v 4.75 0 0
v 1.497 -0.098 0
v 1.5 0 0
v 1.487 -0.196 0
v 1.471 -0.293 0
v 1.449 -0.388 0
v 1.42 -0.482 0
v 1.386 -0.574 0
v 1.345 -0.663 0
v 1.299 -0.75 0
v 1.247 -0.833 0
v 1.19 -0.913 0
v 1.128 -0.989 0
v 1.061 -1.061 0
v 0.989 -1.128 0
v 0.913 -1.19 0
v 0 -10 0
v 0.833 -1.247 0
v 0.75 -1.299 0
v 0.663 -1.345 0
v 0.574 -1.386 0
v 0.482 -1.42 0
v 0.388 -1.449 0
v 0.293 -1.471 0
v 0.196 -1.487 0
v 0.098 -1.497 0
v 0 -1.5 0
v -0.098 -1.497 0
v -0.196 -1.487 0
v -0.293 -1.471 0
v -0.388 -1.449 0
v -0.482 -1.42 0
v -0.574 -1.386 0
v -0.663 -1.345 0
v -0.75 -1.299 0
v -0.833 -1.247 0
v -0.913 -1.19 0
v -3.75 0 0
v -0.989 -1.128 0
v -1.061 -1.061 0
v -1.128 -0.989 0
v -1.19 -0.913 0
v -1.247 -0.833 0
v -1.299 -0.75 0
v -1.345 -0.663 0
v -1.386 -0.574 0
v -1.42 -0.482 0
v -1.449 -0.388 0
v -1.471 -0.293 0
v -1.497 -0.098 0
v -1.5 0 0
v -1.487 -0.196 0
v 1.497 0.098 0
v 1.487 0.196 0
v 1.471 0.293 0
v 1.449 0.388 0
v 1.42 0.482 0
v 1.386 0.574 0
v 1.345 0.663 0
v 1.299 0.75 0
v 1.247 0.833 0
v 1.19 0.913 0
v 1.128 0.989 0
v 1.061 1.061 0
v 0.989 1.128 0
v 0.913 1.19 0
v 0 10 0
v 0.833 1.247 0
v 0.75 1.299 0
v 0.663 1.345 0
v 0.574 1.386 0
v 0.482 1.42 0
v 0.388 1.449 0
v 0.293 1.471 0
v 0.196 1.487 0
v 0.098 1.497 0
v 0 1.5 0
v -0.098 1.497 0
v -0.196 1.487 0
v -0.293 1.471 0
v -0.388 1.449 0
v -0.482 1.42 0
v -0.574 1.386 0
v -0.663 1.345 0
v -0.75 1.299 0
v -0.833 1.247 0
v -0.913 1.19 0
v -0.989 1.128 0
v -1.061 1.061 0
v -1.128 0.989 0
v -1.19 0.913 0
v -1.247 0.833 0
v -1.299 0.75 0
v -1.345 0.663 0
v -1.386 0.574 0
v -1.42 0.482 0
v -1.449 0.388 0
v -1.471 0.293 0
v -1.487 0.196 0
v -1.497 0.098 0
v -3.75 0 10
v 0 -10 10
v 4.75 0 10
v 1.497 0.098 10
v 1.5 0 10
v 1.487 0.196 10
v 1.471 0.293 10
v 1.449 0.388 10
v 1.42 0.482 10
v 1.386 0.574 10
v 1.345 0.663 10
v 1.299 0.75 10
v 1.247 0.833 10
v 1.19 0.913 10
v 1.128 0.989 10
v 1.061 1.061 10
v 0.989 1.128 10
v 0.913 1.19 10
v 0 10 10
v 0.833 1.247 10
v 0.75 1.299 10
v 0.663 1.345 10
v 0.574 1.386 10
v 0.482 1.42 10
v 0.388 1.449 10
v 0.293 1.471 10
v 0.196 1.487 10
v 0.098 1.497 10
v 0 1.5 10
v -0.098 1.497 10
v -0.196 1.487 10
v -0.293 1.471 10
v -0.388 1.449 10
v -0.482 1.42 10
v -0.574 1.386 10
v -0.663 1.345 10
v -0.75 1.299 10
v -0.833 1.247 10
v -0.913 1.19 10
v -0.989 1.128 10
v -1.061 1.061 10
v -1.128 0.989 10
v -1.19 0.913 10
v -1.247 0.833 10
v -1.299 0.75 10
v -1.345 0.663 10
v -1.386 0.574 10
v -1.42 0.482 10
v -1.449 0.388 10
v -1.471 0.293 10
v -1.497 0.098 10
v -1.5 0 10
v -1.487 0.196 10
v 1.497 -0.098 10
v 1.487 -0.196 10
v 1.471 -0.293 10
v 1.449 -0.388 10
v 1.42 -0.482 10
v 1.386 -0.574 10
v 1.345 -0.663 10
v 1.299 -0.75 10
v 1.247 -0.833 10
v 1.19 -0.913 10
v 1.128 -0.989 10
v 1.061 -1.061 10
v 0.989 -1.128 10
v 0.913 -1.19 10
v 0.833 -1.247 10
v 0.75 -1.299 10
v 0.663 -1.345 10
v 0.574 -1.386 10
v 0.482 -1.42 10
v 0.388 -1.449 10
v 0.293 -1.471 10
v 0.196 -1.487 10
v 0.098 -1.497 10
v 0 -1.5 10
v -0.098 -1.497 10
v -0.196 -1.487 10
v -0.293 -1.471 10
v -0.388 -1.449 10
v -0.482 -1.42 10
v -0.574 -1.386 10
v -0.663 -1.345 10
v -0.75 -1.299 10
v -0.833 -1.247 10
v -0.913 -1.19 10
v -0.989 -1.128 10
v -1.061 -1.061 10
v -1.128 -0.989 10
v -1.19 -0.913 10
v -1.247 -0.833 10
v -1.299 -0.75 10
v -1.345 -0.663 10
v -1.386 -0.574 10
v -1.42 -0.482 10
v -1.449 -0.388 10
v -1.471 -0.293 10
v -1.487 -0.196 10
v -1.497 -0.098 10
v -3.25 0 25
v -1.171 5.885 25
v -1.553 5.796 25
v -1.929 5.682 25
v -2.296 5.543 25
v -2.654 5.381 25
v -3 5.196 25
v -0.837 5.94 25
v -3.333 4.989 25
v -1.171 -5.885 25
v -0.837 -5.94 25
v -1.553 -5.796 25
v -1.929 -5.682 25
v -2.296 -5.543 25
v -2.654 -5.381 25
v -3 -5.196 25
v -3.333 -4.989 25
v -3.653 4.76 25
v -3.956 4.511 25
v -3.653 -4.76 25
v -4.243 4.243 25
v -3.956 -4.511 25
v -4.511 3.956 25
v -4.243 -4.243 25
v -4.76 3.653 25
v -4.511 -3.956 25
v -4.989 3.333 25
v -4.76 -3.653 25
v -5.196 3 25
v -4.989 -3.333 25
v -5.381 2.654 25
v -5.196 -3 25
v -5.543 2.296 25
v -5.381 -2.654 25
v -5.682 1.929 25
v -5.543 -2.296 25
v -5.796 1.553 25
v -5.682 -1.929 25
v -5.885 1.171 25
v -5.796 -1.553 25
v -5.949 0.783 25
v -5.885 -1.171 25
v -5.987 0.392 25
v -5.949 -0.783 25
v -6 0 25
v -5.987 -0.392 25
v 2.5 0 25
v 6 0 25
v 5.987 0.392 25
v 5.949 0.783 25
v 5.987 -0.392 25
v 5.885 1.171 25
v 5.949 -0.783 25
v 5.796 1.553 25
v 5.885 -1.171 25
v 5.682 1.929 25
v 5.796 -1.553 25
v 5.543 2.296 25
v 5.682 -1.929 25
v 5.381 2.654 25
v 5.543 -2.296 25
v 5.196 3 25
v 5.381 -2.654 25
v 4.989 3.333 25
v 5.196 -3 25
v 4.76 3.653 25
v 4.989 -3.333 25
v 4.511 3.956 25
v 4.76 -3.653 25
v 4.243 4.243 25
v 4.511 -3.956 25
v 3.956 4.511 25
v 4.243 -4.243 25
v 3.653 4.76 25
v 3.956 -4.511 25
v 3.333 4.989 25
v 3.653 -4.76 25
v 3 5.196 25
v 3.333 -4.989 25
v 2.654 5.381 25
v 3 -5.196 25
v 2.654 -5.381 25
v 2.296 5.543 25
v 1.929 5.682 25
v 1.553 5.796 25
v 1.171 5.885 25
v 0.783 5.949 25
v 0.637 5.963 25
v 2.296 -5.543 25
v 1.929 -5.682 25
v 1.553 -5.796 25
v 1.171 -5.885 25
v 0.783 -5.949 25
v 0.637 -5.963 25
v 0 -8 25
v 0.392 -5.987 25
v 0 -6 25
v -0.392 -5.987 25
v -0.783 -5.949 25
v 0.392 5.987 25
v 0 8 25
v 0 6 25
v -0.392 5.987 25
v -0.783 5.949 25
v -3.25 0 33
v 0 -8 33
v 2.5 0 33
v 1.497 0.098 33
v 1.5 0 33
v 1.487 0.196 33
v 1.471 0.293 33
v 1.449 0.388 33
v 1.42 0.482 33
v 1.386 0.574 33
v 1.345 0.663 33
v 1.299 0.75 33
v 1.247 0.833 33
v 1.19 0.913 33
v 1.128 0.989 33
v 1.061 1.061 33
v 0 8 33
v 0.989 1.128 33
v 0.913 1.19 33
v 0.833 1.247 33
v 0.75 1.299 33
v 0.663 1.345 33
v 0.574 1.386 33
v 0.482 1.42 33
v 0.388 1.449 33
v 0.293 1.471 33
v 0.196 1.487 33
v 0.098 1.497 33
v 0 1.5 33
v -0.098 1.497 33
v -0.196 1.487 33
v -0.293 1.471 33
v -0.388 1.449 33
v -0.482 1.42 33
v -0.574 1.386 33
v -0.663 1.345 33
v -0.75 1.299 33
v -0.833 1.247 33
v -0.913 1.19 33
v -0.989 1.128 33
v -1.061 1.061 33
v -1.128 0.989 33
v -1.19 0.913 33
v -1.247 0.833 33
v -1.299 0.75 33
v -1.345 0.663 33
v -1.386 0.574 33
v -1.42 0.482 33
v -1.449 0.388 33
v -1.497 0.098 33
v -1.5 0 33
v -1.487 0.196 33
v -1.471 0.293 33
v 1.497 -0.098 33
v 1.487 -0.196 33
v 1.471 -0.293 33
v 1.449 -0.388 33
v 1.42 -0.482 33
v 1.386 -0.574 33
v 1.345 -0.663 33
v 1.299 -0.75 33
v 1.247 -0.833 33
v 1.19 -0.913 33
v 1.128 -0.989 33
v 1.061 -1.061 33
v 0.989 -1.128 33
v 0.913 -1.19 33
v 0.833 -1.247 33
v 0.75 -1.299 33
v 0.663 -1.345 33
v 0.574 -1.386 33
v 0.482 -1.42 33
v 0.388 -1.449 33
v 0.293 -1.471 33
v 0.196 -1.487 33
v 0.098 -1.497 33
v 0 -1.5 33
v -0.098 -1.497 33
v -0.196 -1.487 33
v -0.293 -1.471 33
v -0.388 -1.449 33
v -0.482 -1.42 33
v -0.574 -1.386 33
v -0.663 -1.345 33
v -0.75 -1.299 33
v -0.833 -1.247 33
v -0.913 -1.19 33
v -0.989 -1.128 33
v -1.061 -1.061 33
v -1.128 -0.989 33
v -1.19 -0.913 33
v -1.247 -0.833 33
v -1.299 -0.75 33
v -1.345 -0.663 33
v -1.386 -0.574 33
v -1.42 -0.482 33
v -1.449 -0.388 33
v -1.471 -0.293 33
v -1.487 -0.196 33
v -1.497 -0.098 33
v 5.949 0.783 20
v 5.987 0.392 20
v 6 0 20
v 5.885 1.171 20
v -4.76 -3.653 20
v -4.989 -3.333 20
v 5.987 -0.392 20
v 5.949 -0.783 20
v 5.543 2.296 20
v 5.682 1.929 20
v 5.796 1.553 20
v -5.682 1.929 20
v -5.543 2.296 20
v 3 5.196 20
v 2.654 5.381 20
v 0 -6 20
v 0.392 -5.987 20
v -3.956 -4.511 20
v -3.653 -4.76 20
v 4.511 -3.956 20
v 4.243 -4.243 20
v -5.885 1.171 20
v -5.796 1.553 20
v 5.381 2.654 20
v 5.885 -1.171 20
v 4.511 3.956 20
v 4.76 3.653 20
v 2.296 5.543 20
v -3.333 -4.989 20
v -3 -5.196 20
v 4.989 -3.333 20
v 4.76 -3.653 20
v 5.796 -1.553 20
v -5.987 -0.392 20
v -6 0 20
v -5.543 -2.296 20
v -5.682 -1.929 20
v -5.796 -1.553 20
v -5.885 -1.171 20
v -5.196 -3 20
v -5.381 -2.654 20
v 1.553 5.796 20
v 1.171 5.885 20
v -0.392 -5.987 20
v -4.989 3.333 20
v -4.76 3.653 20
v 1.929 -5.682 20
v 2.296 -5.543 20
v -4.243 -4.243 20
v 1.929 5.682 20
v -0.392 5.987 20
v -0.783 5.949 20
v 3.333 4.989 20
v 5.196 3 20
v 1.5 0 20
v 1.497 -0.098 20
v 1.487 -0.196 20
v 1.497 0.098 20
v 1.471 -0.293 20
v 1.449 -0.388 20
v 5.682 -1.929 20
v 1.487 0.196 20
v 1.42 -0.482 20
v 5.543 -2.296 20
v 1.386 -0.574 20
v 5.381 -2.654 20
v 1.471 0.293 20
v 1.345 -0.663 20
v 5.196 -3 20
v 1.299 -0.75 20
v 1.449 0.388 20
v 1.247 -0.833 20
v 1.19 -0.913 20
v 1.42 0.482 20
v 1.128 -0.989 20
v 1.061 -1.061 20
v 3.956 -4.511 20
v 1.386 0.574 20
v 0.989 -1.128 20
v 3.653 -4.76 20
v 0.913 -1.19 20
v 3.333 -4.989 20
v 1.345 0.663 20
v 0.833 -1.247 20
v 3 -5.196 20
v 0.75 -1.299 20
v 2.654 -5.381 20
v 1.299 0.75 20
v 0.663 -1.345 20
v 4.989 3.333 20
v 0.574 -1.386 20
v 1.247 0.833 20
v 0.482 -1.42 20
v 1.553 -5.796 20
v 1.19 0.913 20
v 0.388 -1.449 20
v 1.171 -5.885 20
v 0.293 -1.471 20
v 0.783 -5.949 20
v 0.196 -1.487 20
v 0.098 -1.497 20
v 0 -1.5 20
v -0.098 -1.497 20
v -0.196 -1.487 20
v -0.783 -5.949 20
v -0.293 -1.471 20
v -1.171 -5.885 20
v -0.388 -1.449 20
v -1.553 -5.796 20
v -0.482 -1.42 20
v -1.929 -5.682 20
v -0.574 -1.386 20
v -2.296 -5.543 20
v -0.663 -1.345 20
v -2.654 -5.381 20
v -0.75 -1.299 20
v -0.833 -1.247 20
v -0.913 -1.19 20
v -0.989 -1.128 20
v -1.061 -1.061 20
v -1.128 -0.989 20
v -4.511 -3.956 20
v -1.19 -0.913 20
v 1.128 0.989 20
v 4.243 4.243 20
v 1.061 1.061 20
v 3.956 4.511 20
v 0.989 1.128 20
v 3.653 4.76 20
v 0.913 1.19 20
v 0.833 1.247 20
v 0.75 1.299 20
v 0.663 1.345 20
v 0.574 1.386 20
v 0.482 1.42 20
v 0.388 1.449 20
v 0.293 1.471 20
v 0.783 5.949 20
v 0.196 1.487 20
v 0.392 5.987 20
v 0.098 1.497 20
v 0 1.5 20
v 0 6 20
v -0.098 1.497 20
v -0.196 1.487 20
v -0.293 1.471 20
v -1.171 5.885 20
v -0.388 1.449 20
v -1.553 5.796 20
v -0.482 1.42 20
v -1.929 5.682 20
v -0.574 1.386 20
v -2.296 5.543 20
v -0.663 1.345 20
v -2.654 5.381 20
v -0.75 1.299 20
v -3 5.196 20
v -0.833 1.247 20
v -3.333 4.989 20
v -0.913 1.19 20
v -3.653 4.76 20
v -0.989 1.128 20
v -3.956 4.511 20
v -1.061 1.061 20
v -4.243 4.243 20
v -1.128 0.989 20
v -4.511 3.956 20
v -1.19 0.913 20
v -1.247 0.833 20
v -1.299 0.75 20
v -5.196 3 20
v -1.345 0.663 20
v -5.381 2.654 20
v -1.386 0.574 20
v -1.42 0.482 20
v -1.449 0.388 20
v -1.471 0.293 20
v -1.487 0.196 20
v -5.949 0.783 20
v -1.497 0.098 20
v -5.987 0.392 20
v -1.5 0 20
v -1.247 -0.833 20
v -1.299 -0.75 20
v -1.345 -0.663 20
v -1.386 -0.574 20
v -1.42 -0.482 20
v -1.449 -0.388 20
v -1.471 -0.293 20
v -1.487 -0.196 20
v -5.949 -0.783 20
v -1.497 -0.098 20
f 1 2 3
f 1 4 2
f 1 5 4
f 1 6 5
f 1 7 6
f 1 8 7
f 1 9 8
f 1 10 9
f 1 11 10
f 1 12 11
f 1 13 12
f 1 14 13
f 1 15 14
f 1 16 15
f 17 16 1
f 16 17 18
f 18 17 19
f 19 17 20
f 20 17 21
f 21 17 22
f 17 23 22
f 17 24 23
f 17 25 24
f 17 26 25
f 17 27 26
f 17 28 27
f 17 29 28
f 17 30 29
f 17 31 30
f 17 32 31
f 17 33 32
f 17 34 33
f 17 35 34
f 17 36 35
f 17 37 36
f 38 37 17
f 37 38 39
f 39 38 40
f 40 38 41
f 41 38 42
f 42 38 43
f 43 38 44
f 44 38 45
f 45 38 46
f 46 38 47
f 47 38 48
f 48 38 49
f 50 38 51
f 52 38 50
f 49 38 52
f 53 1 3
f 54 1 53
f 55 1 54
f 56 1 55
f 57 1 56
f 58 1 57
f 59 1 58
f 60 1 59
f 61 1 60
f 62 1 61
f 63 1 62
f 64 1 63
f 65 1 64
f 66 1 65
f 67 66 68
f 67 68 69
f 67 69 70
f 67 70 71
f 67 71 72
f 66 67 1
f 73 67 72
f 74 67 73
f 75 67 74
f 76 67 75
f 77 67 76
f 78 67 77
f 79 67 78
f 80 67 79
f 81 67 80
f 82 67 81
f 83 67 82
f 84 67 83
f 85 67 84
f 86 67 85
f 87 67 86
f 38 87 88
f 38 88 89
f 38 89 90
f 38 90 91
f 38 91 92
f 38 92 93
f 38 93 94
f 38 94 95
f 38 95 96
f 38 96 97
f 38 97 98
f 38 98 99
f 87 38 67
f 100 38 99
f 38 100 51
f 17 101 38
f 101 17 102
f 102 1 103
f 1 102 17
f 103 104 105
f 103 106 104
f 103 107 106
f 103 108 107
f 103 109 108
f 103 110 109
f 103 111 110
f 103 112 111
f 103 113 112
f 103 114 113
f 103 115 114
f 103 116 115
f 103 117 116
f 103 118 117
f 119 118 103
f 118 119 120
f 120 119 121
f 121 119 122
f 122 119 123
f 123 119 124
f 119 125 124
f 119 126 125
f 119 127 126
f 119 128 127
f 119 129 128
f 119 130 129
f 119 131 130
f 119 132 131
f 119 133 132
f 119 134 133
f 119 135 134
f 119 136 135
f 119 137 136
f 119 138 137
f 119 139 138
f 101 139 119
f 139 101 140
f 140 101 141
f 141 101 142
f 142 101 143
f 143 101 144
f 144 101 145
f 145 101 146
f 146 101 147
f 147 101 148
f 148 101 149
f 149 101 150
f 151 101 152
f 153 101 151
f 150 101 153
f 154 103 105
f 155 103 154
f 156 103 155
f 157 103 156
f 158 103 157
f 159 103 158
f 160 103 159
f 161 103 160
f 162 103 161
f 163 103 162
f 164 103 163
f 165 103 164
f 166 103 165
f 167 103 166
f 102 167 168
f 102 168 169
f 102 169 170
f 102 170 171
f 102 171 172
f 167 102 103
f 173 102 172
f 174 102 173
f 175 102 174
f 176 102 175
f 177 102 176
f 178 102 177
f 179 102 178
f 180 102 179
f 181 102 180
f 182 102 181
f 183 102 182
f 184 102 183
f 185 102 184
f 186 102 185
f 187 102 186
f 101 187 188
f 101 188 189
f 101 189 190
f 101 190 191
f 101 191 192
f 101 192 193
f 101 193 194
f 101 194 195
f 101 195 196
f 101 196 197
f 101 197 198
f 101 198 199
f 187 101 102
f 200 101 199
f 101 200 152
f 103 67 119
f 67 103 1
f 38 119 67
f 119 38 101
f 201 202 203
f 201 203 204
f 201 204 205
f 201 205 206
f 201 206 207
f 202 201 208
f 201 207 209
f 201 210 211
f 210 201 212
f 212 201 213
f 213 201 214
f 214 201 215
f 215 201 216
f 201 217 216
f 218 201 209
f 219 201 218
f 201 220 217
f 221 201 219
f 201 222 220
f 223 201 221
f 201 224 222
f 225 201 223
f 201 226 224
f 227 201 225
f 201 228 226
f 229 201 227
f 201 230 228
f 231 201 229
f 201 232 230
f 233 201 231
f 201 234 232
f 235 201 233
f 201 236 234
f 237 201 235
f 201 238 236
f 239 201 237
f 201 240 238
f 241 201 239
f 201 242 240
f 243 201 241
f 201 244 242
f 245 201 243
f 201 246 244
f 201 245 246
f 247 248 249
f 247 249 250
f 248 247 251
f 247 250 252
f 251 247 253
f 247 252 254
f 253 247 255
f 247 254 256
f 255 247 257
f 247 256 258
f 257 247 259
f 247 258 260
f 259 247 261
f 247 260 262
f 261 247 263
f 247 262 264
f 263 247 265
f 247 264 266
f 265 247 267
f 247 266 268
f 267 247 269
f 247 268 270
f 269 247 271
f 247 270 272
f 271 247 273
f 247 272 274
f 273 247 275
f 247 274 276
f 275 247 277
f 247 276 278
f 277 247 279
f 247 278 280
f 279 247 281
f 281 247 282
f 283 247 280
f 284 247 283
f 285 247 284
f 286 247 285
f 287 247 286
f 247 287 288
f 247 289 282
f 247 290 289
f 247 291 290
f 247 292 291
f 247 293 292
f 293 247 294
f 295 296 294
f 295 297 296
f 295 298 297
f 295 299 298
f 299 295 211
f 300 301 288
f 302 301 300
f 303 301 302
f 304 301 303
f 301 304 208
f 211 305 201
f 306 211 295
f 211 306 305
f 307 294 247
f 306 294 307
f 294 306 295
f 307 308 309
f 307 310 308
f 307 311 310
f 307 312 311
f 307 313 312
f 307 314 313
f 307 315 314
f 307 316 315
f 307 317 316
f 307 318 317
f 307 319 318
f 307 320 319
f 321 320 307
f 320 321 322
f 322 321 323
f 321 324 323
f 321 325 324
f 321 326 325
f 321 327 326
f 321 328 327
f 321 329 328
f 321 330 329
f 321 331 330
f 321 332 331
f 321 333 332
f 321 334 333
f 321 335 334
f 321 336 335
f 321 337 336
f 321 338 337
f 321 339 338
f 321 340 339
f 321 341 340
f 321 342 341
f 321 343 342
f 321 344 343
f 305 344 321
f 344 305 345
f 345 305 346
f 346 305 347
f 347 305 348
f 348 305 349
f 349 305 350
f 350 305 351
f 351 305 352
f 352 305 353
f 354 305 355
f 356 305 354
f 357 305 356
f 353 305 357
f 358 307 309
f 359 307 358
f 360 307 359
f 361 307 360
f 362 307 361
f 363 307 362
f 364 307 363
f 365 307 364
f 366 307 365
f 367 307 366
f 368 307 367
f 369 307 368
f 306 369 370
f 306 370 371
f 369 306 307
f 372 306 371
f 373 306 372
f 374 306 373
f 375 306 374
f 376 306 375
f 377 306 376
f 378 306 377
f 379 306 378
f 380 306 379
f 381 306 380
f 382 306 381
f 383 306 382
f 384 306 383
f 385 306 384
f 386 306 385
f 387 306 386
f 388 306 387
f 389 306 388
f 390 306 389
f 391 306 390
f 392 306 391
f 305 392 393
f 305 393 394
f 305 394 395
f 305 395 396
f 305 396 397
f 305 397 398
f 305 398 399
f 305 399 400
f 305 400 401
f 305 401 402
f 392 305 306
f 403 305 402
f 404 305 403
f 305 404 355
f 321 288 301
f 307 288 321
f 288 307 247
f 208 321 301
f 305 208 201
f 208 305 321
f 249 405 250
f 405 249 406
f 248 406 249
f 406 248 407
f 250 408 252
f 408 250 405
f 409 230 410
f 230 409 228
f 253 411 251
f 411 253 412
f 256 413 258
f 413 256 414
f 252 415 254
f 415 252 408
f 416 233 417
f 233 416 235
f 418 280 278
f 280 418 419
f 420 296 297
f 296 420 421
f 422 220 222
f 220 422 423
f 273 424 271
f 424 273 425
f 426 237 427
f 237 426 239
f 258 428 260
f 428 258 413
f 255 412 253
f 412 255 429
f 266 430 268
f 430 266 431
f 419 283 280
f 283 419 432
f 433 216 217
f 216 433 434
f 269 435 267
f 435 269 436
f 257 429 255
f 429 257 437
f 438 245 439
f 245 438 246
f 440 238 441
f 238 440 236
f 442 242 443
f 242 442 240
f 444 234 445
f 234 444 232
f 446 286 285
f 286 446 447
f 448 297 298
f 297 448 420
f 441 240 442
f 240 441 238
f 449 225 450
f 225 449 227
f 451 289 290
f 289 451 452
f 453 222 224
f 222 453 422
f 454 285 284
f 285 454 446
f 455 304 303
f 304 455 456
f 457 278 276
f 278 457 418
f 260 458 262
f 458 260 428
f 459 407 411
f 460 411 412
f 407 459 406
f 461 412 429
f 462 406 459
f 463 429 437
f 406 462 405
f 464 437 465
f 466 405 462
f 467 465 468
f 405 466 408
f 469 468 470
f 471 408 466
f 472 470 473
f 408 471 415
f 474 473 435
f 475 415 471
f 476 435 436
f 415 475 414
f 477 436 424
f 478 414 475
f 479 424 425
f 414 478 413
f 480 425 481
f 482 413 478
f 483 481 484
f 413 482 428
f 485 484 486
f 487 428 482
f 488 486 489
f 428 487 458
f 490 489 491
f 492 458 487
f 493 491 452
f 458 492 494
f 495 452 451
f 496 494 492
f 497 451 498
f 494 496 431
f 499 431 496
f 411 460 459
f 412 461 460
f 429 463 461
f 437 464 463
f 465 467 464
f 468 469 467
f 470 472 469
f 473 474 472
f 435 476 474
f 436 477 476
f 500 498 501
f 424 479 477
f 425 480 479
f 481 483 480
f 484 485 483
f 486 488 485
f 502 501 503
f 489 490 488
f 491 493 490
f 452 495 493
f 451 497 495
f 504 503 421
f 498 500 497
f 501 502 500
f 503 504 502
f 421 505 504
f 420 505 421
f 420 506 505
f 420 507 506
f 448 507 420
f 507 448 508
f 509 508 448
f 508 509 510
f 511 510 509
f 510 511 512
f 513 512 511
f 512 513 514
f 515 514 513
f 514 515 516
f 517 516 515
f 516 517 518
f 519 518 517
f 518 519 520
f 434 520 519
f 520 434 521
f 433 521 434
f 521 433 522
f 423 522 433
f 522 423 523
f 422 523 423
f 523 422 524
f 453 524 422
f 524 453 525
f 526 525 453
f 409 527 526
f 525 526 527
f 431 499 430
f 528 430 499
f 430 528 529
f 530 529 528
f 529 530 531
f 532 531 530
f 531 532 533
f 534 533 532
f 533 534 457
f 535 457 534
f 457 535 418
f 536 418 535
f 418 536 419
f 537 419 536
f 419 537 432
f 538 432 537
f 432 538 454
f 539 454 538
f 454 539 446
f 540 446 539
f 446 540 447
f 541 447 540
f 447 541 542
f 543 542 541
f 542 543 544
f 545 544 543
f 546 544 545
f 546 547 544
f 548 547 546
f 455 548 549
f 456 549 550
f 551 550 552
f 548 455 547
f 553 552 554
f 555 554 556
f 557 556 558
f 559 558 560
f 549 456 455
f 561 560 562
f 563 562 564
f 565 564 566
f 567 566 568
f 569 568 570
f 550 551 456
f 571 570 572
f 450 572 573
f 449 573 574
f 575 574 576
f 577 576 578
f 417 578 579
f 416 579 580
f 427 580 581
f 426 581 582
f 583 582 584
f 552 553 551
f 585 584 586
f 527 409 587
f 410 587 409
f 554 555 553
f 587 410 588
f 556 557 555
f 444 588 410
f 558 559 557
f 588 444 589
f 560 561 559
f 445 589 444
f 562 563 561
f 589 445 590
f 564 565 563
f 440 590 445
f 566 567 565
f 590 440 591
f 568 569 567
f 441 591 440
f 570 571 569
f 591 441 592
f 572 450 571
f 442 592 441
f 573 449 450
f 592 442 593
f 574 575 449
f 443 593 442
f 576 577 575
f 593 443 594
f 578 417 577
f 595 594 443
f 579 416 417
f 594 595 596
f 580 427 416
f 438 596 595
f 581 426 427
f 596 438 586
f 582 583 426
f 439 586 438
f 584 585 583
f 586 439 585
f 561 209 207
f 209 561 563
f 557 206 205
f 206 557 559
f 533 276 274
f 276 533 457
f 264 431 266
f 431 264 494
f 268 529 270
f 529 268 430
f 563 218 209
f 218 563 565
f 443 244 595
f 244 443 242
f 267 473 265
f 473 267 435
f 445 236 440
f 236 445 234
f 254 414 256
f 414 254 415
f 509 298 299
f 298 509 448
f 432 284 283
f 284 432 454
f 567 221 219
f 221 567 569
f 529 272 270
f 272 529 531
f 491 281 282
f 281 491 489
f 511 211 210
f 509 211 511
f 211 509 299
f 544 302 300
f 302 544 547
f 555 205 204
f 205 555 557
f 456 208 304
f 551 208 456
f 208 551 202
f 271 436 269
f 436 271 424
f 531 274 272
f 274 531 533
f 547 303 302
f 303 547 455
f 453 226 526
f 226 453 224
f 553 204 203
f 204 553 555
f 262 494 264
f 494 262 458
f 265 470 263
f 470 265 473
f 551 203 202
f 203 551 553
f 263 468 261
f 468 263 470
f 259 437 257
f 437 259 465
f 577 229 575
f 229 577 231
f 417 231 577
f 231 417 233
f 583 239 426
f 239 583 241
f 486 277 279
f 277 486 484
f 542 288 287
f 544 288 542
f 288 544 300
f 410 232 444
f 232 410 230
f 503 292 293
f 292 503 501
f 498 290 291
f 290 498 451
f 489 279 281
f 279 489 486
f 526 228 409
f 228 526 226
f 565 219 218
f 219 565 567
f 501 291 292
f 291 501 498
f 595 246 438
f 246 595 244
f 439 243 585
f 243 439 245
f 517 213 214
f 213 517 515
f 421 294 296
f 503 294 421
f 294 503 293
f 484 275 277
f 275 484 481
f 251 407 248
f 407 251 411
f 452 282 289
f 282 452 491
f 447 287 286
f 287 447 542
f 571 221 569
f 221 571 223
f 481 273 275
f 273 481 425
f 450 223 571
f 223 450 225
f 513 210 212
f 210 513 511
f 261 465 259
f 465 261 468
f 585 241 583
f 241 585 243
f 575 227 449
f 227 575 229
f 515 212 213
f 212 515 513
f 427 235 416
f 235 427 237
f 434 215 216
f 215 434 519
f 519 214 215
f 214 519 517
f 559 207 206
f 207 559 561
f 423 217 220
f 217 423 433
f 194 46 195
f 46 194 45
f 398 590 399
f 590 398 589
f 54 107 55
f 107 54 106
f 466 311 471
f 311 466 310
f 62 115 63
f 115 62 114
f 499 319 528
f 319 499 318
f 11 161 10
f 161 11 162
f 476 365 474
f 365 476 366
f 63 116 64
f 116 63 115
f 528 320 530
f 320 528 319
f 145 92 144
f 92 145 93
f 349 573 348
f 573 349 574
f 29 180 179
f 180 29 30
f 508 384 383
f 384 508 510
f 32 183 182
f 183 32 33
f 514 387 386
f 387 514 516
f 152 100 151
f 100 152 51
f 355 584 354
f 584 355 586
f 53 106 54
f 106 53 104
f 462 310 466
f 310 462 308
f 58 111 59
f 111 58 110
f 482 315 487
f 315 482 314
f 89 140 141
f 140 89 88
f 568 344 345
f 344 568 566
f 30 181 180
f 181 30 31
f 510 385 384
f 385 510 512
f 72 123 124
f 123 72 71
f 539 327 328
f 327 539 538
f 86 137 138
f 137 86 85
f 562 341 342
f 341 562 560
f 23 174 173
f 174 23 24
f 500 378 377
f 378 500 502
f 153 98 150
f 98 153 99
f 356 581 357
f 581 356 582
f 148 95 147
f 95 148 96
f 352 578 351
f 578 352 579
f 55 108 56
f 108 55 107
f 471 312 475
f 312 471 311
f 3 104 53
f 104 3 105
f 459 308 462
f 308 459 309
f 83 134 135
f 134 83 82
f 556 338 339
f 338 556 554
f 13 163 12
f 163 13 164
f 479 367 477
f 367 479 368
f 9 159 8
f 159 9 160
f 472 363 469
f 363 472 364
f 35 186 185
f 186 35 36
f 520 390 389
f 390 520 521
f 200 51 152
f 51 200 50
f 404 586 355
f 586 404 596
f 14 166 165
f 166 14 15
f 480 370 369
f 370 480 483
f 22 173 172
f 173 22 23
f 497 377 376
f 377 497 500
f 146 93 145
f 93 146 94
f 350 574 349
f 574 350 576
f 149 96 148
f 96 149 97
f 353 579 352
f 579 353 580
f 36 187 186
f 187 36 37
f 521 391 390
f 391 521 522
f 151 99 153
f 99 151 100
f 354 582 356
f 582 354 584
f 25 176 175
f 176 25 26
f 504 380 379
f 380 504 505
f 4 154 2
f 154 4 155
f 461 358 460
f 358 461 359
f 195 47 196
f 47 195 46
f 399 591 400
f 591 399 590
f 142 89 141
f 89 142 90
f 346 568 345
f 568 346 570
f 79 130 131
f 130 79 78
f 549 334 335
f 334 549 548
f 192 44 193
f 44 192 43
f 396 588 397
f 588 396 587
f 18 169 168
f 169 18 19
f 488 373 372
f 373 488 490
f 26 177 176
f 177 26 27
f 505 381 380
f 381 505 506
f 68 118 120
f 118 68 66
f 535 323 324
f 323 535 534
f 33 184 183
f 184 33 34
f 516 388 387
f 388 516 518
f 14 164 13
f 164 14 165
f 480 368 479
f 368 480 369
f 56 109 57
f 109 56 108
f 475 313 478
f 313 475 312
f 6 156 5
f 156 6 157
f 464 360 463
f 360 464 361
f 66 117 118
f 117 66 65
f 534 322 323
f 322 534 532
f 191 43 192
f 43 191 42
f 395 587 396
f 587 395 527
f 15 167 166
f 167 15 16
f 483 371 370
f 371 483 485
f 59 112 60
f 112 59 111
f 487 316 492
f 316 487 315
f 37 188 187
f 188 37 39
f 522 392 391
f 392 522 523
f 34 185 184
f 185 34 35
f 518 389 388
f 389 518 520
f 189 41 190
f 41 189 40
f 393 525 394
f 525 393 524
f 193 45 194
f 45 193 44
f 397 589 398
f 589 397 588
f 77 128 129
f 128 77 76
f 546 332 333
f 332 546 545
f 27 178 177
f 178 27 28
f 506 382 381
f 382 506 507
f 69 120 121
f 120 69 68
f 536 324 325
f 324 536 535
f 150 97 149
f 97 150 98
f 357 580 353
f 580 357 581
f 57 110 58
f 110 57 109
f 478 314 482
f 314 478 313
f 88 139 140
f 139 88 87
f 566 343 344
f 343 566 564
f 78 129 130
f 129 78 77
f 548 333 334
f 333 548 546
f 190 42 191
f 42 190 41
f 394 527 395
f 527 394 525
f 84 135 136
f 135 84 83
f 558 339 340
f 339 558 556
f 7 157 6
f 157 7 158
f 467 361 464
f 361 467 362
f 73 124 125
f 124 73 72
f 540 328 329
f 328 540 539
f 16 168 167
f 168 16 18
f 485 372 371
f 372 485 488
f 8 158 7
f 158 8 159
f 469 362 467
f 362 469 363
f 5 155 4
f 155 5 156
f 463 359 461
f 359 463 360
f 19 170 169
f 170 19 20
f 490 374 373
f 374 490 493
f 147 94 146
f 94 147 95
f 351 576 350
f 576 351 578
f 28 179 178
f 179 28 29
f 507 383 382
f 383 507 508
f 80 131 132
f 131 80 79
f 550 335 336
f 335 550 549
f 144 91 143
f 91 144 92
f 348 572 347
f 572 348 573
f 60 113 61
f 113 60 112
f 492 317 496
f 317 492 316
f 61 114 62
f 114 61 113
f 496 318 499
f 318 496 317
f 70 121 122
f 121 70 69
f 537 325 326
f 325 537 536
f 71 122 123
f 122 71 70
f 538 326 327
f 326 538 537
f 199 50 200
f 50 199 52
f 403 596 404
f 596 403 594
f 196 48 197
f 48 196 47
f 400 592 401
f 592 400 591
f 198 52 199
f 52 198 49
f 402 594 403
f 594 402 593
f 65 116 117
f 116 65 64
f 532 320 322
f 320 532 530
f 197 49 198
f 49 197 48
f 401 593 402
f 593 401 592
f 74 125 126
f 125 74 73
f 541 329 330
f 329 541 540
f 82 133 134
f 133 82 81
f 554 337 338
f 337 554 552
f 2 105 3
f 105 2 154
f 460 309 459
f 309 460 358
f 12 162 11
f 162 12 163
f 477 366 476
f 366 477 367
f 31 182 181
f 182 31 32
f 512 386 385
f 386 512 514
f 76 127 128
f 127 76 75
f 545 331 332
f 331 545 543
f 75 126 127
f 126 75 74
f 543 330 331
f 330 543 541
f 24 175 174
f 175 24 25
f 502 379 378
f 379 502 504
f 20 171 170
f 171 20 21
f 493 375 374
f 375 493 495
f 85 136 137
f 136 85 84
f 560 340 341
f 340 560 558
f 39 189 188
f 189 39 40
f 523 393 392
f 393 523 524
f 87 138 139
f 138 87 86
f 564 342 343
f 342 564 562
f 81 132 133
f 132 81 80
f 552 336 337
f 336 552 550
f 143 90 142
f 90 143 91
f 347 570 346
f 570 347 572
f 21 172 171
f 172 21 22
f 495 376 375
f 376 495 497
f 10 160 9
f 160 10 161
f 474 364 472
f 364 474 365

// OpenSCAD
// Hose-barb reducer: joins 8 mm ID silicone tubing to 5 mm ID tubing
// Print orientation: standing upright along Z, centred on origin in X/Y

$fn = 96;

// ---- Dimensions (mm) ----
tube8_d      = 8;    // inner diameter of larger tubing
tube5_d      = 5;    // inner diameter of smaller tubing
bore_d       = 3;    // through-bore diameter
barb8_h      = 10;   // height of each 8 mm barb
barb8_od_bot = 7.5;  // outer diameter of 8 mm barb at bottom
barb8_od_top = 9.5;  // outer diameter of 8 mm barb at top
collar_d     = 12;   // diameter of cylindrical collar
collar_h     = 5;    // height of collar (z = 20 to 25)
barb5_h      = 8;    // height of each 5 mm barb
barb5_od_bot = 6.5;  // outer diameter of 5 mm barb at bottom
barb5_od_top = 5.0;  // outer diameter of 5 mm barb at top
eps          = 0.5;  // overshoot for clean boolean cuts

// ---- Model ----
difference() {
    union() {
        // Lower section: two stacked sawtooth barbs for 8 mm tubing (z = 0..20)
        for (s = [-1, 1])
            translate([0, 0, 0])
                linear_extrude(height = barb8_h)
                    polygon(points = [
                        [- barb8_od_bot / 2, 0],
                        [ barb8_od_top / 2, 0],
                        [ 0, barb8_h * s]
                    ]);

        // Collar (z = 20..25)
        translate([0, 0, 20])
            cylinder(d = collar_d, h = collar_h);

        // Upper section: two stacked barbs for 5 mm tubing (z = 25..41)
        for (s = [-1, 1])
            translate([0, 0, 25])
                linear_extrude(height = barb5_h)
                    polygon(points = [
                        [- barb5_od_bot / 2, 0],
                        [ barb5_od_top / 2, 0],
                        [ 0, barb5_h * s]
                    ]);
    }

    // Full-length through bore
    translate([0, 0, -eps])
        cylinder(d = bore_d, h = 41 + 2 * eps);
}
